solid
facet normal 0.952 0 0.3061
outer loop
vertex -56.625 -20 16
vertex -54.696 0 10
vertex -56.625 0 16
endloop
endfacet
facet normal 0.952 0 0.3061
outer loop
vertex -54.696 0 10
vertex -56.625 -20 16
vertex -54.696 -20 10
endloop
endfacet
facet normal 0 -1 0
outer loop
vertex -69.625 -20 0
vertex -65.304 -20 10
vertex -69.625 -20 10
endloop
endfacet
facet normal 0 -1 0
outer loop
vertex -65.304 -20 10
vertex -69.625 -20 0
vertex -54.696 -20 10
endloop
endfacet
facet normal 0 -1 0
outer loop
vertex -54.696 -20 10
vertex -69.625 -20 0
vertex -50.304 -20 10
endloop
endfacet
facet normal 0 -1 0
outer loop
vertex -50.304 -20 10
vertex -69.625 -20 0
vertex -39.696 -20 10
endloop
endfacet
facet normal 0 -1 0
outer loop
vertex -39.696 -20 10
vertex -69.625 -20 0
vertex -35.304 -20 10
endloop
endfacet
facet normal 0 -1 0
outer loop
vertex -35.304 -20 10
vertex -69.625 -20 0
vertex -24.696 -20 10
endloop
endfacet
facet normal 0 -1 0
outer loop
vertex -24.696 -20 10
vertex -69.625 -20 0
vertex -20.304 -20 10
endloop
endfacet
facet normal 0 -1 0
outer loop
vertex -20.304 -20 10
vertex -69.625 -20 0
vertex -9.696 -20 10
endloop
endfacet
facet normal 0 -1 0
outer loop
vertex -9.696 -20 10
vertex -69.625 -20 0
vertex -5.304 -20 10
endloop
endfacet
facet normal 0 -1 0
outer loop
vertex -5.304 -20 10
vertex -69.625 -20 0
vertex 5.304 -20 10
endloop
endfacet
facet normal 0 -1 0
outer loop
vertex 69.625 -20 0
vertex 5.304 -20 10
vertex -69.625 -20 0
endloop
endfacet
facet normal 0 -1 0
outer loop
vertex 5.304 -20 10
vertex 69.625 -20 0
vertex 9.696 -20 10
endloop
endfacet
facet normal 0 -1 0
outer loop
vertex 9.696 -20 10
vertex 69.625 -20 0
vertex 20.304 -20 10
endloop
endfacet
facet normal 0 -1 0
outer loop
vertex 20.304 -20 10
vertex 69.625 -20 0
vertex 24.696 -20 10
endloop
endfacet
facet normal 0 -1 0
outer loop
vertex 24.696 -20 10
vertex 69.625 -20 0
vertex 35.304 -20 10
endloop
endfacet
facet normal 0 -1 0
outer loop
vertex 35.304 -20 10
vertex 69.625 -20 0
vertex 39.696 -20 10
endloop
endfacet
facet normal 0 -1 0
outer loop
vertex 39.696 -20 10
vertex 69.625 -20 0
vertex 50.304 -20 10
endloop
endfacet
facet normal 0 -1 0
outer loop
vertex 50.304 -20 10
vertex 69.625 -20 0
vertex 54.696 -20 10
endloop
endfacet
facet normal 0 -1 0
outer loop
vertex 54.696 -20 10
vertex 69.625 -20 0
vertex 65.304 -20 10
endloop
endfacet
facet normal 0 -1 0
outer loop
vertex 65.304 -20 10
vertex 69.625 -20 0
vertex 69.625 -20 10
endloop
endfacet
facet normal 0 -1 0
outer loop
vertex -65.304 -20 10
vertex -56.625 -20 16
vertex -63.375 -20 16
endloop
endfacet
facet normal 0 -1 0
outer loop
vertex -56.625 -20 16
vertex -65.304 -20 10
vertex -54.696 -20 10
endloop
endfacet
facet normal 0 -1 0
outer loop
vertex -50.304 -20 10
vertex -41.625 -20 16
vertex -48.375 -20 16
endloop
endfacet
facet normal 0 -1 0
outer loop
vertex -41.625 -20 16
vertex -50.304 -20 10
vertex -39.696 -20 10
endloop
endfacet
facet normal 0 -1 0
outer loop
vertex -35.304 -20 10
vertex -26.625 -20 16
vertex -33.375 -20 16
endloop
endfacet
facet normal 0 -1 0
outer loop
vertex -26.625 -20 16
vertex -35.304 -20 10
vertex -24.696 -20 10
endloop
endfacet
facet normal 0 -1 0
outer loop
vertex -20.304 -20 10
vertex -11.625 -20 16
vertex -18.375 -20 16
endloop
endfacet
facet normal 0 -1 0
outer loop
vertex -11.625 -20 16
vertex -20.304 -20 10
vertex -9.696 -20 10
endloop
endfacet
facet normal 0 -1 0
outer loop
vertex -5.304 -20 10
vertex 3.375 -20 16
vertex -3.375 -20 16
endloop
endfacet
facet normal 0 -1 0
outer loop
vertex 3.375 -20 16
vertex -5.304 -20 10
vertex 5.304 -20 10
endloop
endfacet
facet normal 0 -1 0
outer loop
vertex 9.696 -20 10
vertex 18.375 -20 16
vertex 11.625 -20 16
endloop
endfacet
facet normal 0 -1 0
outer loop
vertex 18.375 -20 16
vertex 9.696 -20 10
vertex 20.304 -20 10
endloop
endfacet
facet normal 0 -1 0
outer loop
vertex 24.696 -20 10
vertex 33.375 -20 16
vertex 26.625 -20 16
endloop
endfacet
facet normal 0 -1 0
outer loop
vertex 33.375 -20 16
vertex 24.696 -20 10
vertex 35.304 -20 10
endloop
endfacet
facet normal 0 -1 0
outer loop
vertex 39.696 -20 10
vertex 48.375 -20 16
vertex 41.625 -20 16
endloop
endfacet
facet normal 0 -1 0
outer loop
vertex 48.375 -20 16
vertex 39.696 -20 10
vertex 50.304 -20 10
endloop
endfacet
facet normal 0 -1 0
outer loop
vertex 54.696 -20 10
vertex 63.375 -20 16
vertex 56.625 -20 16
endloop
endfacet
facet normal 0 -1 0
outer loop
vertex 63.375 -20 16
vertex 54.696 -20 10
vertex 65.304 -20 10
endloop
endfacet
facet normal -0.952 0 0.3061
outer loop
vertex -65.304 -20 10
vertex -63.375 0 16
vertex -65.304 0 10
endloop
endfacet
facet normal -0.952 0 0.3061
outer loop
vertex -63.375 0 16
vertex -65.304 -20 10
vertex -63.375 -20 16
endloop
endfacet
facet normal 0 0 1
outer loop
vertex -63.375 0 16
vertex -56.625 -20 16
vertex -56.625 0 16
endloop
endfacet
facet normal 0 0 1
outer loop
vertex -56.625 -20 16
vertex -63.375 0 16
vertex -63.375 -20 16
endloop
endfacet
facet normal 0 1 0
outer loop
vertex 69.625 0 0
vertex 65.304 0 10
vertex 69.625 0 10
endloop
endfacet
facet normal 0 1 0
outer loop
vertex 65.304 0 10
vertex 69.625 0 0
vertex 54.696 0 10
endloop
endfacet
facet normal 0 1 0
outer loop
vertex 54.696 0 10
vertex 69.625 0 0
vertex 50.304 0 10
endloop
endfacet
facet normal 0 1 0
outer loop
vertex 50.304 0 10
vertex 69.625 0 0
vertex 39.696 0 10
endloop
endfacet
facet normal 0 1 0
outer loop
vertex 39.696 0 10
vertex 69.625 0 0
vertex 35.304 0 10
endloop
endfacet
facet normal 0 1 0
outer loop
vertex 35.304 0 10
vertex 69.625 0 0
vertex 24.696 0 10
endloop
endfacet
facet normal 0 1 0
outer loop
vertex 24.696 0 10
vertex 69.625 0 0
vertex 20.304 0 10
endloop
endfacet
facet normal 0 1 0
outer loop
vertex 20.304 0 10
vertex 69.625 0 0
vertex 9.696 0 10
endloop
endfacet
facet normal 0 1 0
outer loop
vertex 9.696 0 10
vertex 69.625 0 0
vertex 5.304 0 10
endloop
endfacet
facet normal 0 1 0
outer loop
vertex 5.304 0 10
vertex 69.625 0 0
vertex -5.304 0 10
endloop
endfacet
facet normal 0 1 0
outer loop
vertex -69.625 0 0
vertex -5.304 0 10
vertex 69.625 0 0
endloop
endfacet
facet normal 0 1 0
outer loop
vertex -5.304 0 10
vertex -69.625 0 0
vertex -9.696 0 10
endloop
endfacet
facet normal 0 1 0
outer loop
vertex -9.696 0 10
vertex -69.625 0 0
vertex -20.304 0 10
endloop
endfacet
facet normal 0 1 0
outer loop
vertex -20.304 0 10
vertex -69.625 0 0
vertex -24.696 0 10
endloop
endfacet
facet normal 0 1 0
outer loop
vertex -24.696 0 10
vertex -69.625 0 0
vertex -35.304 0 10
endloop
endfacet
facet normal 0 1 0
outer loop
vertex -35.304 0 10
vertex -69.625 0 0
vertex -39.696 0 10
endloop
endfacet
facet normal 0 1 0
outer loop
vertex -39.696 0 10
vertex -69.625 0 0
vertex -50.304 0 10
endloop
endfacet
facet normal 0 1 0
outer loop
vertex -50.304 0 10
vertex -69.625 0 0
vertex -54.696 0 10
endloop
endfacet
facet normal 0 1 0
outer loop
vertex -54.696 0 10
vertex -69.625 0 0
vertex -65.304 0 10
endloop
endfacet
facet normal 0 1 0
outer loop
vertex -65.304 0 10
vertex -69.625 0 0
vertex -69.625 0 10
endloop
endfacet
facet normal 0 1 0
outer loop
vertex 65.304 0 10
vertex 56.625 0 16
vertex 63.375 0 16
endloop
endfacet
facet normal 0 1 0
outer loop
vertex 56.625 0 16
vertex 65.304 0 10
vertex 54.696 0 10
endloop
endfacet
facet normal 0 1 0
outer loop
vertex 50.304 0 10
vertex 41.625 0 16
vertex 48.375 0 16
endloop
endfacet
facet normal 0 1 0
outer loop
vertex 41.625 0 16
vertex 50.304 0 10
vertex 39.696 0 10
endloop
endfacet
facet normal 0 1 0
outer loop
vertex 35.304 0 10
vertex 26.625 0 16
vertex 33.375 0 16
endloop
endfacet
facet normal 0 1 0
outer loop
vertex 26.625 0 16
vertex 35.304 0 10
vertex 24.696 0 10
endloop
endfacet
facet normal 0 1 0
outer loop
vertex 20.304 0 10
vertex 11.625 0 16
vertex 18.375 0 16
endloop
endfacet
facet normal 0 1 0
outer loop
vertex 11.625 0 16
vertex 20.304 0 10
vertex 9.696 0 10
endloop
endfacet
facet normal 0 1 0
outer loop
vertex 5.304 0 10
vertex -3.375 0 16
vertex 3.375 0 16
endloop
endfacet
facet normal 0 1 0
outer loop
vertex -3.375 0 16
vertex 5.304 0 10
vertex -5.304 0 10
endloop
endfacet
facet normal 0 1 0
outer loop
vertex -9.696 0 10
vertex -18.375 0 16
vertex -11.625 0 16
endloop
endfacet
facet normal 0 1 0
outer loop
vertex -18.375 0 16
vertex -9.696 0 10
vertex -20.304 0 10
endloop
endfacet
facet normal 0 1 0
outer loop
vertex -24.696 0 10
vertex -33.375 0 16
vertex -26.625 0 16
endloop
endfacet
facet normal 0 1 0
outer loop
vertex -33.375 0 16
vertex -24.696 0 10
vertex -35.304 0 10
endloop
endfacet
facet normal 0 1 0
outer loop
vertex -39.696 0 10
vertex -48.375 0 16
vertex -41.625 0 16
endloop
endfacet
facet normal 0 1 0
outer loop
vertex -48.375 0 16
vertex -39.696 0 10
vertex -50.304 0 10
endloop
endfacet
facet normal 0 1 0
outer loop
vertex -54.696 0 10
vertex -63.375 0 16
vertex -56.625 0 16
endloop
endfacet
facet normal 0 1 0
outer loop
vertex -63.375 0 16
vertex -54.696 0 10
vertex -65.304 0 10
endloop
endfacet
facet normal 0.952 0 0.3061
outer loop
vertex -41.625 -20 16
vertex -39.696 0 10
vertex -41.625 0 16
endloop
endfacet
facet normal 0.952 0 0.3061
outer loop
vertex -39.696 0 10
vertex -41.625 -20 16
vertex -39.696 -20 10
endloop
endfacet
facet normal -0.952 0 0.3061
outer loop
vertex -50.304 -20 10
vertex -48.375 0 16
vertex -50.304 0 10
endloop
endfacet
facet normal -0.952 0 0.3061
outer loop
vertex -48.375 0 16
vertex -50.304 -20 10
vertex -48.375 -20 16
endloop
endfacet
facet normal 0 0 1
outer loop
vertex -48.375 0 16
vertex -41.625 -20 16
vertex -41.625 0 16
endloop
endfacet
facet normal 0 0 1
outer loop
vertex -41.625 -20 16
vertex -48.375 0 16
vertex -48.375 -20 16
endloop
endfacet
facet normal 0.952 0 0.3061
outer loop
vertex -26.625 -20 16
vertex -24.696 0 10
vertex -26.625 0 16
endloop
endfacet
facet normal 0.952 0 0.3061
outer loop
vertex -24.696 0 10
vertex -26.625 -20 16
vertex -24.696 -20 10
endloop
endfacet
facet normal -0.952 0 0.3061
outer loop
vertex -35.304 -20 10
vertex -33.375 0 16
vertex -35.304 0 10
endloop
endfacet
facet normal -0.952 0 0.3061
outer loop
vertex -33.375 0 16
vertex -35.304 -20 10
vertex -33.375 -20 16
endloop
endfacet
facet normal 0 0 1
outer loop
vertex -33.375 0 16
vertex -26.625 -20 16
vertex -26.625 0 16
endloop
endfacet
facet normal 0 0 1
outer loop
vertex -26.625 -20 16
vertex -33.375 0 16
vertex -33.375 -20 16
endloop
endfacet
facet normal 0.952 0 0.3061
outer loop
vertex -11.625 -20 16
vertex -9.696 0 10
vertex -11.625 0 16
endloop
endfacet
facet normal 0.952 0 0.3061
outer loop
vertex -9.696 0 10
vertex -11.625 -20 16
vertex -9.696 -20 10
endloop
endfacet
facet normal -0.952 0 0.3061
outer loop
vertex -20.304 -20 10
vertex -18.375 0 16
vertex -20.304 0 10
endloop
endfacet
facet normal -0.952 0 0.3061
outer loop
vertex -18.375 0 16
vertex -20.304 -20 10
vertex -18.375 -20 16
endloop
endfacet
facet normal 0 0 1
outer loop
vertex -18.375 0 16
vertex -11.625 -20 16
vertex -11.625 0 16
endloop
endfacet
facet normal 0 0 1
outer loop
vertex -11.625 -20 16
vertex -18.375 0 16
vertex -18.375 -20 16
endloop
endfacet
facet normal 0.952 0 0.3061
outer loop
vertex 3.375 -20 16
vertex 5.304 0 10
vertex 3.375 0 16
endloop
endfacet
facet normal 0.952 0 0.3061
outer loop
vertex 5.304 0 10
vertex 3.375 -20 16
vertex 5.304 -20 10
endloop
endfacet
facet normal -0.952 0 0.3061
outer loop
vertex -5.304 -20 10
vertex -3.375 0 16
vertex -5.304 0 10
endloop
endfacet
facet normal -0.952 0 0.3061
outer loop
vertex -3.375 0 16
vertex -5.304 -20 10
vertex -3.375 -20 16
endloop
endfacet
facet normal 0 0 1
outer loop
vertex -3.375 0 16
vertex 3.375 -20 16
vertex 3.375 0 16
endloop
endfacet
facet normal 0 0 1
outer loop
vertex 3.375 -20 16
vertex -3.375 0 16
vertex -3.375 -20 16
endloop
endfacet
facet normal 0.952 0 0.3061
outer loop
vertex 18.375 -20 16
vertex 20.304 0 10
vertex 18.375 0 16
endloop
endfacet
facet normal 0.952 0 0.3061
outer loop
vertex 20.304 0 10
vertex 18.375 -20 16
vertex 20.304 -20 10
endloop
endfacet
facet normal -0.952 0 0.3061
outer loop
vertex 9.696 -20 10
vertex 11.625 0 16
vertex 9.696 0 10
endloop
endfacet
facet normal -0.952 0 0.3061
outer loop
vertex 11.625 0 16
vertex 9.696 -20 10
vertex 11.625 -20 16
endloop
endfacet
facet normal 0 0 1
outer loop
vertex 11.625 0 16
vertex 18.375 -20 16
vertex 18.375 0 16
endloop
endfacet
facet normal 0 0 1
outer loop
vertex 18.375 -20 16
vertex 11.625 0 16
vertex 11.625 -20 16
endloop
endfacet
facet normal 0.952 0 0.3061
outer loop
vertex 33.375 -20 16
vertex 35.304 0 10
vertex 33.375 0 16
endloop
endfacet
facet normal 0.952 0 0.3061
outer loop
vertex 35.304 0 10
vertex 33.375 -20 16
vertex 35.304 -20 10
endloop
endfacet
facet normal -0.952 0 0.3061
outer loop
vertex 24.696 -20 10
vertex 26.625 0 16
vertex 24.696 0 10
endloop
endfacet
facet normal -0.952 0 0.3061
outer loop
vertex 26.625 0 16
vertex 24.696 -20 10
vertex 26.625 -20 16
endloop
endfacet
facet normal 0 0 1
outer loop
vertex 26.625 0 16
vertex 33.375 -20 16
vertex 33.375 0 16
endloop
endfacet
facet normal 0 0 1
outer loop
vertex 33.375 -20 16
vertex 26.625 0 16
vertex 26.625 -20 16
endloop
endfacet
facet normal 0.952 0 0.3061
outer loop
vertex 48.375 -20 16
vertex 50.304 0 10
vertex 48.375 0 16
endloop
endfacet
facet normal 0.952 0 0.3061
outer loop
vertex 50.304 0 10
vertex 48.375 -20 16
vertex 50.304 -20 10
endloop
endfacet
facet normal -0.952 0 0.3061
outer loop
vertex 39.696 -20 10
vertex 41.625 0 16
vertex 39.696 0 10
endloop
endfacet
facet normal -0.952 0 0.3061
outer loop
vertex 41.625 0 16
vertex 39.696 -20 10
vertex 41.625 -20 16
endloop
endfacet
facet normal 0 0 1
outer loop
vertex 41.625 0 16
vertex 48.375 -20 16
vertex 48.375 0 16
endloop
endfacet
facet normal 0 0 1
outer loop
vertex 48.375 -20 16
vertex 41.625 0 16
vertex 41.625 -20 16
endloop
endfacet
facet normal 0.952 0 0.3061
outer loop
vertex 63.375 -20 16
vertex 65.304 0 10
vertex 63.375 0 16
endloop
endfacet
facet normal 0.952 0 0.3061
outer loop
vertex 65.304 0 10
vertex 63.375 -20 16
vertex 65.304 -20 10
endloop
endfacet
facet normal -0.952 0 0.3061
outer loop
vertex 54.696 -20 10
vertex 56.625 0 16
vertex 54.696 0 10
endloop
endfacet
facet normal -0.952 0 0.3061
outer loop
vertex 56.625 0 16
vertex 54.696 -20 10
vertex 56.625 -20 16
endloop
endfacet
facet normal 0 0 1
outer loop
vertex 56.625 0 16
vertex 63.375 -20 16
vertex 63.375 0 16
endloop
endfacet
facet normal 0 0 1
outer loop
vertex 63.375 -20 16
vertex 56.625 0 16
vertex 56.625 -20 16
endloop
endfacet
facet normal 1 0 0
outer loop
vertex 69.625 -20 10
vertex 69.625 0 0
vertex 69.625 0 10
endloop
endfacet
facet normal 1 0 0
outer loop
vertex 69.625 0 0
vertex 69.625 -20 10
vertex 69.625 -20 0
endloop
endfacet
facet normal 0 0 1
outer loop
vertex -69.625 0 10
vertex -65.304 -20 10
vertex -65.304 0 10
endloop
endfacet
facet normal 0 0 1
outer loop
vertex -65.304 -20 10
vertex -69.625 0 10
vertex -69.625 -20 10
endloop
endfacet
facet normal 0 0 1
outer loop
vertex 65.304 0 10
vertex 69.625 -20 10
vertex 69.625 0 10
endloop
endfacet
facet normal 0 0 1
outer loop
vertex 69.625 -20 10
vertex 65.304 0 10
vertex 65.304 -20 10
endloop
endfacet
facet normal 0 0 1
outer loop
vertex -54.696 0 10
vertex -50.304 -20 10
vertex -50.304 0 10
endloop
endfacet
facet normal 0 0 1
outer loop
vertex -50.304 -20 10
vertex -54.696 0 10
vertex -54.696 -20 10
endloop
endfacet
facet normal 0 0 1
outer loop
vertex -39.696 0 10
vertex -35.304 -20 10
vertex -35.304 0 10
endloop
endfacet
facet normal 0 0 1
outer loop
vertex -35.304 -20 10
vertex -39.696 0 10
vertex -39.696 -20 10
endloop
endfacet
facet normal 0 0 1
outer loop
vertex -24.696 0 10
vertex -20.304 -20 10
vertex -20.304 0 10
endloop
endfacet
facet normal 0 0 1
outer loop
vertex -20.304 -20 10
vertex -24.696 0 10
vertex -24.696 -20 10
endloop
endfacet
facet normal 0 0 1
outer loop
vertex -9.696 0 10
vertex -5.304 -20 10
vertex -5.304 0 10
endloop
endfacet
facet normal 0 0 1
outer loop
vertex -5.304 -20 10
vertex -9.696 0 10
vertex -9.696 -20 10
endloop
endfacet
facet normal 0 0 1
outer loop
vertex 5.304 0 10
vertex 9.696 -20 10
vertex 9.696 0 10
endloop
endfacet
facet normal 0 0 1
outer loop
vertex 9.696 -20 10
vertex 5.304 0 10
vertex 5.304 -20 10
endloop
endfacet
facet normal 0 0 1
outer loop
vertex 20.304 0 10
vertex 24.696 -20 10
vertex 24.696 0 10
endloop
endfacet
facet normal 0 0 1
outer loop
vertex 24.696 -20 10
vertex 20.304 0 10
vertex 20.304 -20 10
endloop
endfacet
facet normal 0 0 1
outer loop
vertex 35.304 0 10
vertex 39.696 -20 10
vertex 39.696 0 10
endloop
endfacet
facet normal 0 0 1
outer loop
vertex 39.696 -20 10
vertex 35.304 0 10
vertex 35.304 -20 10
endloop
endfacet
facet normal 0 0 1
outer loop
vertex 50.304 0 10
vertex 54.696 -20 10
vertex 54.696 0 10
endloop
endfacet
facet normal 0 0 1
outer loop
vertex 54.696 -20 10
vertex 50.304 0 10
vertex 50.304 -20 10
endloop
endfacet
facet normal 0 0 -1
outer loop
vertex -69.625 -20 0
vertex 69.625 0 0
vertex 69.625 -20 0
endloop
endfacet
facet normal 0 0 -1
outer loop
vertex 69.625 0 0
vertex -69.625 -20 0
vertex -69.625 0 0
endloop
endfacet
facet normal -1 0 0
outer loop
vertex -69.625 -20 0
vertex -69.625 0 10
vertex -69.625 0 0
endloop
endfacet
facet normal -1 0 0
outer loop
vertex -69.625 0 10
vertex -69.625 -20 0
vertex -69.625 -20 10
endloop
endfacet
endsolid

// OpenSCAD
$fn = 32;

// ----------------------------------------------------------------------
// Toothed rack, 9 teeth
// 15 mm pitch, 6 mm teeth
// ----------------------------------------------------------------------

// --- parameters (mm) ---
bar_w = 20;      // bar width (Y)
bar_h = 10;      // bar height (Z)
teeth = 9;       // number of teeth
pitch = 15;      // tooth pitch
tooth_h = 6;     // tooth height above the bar
root_w = 11.25;  // tooth width at the root
crest_w = 6.75;  // tooth width at the crest

// --- derived feature positions (mm) ---
span = (teeth - 1) * pitch;  // = 120   distance between the outer teeth
bar_l = span + root_w + 8;   // = 139.25   bar length: teeth plus 4 mm at each end
tooth_x = -span / 2;         // = -60   X of the first tooth
height = bar_h + tooth_h;    // = 16   overall height
feature_centers = [
  [tooth_x + 0 * pitch, -bar_w / 2],
  [tooth_x + 1 * pitch, -bar_w / 2],
  [tooth_x + 2 * pitch, -bar_w / 2],
  [tooth_x + 3 * pitch, -bar_w / 2],
  [tooth_x + 4 * pitch, -bar_w / 2],
  [tooth_x + 5 * pitch, -bar_w / 2],
  [tooth_x + 6 * pitch, -bar_w / 2],
  [tooth_x + 7 * pitch, -bar_w / 2],
  [tooth_x + 8 * pitch, -bar_w / 2]
];   // tooth centre line, drives the tooth loop

// bar with a rack of teeth, one extruded trapezoium per centre
module rack_tooth() {
  linear_extrude(height = bar_w)
    polygon(points = [
      [0, 0],
      [root_w, 0],
      [root_w / 2 + crest_w / 2, tooth_h + 1],
      [root_w / 2 - crest_w / 2, tooth_h + 1]
    ]);
}

union() {
  translate([-bar_l / 2, -bar_w, 0]) cube([bar_l, bar_w, bar_h]);
  for (centre = feature_centers)
    translate([centre[0] - root_w / 2, 0, bar_h - 1]) rotate([90, 0, 0]) rack_tooth();
}
